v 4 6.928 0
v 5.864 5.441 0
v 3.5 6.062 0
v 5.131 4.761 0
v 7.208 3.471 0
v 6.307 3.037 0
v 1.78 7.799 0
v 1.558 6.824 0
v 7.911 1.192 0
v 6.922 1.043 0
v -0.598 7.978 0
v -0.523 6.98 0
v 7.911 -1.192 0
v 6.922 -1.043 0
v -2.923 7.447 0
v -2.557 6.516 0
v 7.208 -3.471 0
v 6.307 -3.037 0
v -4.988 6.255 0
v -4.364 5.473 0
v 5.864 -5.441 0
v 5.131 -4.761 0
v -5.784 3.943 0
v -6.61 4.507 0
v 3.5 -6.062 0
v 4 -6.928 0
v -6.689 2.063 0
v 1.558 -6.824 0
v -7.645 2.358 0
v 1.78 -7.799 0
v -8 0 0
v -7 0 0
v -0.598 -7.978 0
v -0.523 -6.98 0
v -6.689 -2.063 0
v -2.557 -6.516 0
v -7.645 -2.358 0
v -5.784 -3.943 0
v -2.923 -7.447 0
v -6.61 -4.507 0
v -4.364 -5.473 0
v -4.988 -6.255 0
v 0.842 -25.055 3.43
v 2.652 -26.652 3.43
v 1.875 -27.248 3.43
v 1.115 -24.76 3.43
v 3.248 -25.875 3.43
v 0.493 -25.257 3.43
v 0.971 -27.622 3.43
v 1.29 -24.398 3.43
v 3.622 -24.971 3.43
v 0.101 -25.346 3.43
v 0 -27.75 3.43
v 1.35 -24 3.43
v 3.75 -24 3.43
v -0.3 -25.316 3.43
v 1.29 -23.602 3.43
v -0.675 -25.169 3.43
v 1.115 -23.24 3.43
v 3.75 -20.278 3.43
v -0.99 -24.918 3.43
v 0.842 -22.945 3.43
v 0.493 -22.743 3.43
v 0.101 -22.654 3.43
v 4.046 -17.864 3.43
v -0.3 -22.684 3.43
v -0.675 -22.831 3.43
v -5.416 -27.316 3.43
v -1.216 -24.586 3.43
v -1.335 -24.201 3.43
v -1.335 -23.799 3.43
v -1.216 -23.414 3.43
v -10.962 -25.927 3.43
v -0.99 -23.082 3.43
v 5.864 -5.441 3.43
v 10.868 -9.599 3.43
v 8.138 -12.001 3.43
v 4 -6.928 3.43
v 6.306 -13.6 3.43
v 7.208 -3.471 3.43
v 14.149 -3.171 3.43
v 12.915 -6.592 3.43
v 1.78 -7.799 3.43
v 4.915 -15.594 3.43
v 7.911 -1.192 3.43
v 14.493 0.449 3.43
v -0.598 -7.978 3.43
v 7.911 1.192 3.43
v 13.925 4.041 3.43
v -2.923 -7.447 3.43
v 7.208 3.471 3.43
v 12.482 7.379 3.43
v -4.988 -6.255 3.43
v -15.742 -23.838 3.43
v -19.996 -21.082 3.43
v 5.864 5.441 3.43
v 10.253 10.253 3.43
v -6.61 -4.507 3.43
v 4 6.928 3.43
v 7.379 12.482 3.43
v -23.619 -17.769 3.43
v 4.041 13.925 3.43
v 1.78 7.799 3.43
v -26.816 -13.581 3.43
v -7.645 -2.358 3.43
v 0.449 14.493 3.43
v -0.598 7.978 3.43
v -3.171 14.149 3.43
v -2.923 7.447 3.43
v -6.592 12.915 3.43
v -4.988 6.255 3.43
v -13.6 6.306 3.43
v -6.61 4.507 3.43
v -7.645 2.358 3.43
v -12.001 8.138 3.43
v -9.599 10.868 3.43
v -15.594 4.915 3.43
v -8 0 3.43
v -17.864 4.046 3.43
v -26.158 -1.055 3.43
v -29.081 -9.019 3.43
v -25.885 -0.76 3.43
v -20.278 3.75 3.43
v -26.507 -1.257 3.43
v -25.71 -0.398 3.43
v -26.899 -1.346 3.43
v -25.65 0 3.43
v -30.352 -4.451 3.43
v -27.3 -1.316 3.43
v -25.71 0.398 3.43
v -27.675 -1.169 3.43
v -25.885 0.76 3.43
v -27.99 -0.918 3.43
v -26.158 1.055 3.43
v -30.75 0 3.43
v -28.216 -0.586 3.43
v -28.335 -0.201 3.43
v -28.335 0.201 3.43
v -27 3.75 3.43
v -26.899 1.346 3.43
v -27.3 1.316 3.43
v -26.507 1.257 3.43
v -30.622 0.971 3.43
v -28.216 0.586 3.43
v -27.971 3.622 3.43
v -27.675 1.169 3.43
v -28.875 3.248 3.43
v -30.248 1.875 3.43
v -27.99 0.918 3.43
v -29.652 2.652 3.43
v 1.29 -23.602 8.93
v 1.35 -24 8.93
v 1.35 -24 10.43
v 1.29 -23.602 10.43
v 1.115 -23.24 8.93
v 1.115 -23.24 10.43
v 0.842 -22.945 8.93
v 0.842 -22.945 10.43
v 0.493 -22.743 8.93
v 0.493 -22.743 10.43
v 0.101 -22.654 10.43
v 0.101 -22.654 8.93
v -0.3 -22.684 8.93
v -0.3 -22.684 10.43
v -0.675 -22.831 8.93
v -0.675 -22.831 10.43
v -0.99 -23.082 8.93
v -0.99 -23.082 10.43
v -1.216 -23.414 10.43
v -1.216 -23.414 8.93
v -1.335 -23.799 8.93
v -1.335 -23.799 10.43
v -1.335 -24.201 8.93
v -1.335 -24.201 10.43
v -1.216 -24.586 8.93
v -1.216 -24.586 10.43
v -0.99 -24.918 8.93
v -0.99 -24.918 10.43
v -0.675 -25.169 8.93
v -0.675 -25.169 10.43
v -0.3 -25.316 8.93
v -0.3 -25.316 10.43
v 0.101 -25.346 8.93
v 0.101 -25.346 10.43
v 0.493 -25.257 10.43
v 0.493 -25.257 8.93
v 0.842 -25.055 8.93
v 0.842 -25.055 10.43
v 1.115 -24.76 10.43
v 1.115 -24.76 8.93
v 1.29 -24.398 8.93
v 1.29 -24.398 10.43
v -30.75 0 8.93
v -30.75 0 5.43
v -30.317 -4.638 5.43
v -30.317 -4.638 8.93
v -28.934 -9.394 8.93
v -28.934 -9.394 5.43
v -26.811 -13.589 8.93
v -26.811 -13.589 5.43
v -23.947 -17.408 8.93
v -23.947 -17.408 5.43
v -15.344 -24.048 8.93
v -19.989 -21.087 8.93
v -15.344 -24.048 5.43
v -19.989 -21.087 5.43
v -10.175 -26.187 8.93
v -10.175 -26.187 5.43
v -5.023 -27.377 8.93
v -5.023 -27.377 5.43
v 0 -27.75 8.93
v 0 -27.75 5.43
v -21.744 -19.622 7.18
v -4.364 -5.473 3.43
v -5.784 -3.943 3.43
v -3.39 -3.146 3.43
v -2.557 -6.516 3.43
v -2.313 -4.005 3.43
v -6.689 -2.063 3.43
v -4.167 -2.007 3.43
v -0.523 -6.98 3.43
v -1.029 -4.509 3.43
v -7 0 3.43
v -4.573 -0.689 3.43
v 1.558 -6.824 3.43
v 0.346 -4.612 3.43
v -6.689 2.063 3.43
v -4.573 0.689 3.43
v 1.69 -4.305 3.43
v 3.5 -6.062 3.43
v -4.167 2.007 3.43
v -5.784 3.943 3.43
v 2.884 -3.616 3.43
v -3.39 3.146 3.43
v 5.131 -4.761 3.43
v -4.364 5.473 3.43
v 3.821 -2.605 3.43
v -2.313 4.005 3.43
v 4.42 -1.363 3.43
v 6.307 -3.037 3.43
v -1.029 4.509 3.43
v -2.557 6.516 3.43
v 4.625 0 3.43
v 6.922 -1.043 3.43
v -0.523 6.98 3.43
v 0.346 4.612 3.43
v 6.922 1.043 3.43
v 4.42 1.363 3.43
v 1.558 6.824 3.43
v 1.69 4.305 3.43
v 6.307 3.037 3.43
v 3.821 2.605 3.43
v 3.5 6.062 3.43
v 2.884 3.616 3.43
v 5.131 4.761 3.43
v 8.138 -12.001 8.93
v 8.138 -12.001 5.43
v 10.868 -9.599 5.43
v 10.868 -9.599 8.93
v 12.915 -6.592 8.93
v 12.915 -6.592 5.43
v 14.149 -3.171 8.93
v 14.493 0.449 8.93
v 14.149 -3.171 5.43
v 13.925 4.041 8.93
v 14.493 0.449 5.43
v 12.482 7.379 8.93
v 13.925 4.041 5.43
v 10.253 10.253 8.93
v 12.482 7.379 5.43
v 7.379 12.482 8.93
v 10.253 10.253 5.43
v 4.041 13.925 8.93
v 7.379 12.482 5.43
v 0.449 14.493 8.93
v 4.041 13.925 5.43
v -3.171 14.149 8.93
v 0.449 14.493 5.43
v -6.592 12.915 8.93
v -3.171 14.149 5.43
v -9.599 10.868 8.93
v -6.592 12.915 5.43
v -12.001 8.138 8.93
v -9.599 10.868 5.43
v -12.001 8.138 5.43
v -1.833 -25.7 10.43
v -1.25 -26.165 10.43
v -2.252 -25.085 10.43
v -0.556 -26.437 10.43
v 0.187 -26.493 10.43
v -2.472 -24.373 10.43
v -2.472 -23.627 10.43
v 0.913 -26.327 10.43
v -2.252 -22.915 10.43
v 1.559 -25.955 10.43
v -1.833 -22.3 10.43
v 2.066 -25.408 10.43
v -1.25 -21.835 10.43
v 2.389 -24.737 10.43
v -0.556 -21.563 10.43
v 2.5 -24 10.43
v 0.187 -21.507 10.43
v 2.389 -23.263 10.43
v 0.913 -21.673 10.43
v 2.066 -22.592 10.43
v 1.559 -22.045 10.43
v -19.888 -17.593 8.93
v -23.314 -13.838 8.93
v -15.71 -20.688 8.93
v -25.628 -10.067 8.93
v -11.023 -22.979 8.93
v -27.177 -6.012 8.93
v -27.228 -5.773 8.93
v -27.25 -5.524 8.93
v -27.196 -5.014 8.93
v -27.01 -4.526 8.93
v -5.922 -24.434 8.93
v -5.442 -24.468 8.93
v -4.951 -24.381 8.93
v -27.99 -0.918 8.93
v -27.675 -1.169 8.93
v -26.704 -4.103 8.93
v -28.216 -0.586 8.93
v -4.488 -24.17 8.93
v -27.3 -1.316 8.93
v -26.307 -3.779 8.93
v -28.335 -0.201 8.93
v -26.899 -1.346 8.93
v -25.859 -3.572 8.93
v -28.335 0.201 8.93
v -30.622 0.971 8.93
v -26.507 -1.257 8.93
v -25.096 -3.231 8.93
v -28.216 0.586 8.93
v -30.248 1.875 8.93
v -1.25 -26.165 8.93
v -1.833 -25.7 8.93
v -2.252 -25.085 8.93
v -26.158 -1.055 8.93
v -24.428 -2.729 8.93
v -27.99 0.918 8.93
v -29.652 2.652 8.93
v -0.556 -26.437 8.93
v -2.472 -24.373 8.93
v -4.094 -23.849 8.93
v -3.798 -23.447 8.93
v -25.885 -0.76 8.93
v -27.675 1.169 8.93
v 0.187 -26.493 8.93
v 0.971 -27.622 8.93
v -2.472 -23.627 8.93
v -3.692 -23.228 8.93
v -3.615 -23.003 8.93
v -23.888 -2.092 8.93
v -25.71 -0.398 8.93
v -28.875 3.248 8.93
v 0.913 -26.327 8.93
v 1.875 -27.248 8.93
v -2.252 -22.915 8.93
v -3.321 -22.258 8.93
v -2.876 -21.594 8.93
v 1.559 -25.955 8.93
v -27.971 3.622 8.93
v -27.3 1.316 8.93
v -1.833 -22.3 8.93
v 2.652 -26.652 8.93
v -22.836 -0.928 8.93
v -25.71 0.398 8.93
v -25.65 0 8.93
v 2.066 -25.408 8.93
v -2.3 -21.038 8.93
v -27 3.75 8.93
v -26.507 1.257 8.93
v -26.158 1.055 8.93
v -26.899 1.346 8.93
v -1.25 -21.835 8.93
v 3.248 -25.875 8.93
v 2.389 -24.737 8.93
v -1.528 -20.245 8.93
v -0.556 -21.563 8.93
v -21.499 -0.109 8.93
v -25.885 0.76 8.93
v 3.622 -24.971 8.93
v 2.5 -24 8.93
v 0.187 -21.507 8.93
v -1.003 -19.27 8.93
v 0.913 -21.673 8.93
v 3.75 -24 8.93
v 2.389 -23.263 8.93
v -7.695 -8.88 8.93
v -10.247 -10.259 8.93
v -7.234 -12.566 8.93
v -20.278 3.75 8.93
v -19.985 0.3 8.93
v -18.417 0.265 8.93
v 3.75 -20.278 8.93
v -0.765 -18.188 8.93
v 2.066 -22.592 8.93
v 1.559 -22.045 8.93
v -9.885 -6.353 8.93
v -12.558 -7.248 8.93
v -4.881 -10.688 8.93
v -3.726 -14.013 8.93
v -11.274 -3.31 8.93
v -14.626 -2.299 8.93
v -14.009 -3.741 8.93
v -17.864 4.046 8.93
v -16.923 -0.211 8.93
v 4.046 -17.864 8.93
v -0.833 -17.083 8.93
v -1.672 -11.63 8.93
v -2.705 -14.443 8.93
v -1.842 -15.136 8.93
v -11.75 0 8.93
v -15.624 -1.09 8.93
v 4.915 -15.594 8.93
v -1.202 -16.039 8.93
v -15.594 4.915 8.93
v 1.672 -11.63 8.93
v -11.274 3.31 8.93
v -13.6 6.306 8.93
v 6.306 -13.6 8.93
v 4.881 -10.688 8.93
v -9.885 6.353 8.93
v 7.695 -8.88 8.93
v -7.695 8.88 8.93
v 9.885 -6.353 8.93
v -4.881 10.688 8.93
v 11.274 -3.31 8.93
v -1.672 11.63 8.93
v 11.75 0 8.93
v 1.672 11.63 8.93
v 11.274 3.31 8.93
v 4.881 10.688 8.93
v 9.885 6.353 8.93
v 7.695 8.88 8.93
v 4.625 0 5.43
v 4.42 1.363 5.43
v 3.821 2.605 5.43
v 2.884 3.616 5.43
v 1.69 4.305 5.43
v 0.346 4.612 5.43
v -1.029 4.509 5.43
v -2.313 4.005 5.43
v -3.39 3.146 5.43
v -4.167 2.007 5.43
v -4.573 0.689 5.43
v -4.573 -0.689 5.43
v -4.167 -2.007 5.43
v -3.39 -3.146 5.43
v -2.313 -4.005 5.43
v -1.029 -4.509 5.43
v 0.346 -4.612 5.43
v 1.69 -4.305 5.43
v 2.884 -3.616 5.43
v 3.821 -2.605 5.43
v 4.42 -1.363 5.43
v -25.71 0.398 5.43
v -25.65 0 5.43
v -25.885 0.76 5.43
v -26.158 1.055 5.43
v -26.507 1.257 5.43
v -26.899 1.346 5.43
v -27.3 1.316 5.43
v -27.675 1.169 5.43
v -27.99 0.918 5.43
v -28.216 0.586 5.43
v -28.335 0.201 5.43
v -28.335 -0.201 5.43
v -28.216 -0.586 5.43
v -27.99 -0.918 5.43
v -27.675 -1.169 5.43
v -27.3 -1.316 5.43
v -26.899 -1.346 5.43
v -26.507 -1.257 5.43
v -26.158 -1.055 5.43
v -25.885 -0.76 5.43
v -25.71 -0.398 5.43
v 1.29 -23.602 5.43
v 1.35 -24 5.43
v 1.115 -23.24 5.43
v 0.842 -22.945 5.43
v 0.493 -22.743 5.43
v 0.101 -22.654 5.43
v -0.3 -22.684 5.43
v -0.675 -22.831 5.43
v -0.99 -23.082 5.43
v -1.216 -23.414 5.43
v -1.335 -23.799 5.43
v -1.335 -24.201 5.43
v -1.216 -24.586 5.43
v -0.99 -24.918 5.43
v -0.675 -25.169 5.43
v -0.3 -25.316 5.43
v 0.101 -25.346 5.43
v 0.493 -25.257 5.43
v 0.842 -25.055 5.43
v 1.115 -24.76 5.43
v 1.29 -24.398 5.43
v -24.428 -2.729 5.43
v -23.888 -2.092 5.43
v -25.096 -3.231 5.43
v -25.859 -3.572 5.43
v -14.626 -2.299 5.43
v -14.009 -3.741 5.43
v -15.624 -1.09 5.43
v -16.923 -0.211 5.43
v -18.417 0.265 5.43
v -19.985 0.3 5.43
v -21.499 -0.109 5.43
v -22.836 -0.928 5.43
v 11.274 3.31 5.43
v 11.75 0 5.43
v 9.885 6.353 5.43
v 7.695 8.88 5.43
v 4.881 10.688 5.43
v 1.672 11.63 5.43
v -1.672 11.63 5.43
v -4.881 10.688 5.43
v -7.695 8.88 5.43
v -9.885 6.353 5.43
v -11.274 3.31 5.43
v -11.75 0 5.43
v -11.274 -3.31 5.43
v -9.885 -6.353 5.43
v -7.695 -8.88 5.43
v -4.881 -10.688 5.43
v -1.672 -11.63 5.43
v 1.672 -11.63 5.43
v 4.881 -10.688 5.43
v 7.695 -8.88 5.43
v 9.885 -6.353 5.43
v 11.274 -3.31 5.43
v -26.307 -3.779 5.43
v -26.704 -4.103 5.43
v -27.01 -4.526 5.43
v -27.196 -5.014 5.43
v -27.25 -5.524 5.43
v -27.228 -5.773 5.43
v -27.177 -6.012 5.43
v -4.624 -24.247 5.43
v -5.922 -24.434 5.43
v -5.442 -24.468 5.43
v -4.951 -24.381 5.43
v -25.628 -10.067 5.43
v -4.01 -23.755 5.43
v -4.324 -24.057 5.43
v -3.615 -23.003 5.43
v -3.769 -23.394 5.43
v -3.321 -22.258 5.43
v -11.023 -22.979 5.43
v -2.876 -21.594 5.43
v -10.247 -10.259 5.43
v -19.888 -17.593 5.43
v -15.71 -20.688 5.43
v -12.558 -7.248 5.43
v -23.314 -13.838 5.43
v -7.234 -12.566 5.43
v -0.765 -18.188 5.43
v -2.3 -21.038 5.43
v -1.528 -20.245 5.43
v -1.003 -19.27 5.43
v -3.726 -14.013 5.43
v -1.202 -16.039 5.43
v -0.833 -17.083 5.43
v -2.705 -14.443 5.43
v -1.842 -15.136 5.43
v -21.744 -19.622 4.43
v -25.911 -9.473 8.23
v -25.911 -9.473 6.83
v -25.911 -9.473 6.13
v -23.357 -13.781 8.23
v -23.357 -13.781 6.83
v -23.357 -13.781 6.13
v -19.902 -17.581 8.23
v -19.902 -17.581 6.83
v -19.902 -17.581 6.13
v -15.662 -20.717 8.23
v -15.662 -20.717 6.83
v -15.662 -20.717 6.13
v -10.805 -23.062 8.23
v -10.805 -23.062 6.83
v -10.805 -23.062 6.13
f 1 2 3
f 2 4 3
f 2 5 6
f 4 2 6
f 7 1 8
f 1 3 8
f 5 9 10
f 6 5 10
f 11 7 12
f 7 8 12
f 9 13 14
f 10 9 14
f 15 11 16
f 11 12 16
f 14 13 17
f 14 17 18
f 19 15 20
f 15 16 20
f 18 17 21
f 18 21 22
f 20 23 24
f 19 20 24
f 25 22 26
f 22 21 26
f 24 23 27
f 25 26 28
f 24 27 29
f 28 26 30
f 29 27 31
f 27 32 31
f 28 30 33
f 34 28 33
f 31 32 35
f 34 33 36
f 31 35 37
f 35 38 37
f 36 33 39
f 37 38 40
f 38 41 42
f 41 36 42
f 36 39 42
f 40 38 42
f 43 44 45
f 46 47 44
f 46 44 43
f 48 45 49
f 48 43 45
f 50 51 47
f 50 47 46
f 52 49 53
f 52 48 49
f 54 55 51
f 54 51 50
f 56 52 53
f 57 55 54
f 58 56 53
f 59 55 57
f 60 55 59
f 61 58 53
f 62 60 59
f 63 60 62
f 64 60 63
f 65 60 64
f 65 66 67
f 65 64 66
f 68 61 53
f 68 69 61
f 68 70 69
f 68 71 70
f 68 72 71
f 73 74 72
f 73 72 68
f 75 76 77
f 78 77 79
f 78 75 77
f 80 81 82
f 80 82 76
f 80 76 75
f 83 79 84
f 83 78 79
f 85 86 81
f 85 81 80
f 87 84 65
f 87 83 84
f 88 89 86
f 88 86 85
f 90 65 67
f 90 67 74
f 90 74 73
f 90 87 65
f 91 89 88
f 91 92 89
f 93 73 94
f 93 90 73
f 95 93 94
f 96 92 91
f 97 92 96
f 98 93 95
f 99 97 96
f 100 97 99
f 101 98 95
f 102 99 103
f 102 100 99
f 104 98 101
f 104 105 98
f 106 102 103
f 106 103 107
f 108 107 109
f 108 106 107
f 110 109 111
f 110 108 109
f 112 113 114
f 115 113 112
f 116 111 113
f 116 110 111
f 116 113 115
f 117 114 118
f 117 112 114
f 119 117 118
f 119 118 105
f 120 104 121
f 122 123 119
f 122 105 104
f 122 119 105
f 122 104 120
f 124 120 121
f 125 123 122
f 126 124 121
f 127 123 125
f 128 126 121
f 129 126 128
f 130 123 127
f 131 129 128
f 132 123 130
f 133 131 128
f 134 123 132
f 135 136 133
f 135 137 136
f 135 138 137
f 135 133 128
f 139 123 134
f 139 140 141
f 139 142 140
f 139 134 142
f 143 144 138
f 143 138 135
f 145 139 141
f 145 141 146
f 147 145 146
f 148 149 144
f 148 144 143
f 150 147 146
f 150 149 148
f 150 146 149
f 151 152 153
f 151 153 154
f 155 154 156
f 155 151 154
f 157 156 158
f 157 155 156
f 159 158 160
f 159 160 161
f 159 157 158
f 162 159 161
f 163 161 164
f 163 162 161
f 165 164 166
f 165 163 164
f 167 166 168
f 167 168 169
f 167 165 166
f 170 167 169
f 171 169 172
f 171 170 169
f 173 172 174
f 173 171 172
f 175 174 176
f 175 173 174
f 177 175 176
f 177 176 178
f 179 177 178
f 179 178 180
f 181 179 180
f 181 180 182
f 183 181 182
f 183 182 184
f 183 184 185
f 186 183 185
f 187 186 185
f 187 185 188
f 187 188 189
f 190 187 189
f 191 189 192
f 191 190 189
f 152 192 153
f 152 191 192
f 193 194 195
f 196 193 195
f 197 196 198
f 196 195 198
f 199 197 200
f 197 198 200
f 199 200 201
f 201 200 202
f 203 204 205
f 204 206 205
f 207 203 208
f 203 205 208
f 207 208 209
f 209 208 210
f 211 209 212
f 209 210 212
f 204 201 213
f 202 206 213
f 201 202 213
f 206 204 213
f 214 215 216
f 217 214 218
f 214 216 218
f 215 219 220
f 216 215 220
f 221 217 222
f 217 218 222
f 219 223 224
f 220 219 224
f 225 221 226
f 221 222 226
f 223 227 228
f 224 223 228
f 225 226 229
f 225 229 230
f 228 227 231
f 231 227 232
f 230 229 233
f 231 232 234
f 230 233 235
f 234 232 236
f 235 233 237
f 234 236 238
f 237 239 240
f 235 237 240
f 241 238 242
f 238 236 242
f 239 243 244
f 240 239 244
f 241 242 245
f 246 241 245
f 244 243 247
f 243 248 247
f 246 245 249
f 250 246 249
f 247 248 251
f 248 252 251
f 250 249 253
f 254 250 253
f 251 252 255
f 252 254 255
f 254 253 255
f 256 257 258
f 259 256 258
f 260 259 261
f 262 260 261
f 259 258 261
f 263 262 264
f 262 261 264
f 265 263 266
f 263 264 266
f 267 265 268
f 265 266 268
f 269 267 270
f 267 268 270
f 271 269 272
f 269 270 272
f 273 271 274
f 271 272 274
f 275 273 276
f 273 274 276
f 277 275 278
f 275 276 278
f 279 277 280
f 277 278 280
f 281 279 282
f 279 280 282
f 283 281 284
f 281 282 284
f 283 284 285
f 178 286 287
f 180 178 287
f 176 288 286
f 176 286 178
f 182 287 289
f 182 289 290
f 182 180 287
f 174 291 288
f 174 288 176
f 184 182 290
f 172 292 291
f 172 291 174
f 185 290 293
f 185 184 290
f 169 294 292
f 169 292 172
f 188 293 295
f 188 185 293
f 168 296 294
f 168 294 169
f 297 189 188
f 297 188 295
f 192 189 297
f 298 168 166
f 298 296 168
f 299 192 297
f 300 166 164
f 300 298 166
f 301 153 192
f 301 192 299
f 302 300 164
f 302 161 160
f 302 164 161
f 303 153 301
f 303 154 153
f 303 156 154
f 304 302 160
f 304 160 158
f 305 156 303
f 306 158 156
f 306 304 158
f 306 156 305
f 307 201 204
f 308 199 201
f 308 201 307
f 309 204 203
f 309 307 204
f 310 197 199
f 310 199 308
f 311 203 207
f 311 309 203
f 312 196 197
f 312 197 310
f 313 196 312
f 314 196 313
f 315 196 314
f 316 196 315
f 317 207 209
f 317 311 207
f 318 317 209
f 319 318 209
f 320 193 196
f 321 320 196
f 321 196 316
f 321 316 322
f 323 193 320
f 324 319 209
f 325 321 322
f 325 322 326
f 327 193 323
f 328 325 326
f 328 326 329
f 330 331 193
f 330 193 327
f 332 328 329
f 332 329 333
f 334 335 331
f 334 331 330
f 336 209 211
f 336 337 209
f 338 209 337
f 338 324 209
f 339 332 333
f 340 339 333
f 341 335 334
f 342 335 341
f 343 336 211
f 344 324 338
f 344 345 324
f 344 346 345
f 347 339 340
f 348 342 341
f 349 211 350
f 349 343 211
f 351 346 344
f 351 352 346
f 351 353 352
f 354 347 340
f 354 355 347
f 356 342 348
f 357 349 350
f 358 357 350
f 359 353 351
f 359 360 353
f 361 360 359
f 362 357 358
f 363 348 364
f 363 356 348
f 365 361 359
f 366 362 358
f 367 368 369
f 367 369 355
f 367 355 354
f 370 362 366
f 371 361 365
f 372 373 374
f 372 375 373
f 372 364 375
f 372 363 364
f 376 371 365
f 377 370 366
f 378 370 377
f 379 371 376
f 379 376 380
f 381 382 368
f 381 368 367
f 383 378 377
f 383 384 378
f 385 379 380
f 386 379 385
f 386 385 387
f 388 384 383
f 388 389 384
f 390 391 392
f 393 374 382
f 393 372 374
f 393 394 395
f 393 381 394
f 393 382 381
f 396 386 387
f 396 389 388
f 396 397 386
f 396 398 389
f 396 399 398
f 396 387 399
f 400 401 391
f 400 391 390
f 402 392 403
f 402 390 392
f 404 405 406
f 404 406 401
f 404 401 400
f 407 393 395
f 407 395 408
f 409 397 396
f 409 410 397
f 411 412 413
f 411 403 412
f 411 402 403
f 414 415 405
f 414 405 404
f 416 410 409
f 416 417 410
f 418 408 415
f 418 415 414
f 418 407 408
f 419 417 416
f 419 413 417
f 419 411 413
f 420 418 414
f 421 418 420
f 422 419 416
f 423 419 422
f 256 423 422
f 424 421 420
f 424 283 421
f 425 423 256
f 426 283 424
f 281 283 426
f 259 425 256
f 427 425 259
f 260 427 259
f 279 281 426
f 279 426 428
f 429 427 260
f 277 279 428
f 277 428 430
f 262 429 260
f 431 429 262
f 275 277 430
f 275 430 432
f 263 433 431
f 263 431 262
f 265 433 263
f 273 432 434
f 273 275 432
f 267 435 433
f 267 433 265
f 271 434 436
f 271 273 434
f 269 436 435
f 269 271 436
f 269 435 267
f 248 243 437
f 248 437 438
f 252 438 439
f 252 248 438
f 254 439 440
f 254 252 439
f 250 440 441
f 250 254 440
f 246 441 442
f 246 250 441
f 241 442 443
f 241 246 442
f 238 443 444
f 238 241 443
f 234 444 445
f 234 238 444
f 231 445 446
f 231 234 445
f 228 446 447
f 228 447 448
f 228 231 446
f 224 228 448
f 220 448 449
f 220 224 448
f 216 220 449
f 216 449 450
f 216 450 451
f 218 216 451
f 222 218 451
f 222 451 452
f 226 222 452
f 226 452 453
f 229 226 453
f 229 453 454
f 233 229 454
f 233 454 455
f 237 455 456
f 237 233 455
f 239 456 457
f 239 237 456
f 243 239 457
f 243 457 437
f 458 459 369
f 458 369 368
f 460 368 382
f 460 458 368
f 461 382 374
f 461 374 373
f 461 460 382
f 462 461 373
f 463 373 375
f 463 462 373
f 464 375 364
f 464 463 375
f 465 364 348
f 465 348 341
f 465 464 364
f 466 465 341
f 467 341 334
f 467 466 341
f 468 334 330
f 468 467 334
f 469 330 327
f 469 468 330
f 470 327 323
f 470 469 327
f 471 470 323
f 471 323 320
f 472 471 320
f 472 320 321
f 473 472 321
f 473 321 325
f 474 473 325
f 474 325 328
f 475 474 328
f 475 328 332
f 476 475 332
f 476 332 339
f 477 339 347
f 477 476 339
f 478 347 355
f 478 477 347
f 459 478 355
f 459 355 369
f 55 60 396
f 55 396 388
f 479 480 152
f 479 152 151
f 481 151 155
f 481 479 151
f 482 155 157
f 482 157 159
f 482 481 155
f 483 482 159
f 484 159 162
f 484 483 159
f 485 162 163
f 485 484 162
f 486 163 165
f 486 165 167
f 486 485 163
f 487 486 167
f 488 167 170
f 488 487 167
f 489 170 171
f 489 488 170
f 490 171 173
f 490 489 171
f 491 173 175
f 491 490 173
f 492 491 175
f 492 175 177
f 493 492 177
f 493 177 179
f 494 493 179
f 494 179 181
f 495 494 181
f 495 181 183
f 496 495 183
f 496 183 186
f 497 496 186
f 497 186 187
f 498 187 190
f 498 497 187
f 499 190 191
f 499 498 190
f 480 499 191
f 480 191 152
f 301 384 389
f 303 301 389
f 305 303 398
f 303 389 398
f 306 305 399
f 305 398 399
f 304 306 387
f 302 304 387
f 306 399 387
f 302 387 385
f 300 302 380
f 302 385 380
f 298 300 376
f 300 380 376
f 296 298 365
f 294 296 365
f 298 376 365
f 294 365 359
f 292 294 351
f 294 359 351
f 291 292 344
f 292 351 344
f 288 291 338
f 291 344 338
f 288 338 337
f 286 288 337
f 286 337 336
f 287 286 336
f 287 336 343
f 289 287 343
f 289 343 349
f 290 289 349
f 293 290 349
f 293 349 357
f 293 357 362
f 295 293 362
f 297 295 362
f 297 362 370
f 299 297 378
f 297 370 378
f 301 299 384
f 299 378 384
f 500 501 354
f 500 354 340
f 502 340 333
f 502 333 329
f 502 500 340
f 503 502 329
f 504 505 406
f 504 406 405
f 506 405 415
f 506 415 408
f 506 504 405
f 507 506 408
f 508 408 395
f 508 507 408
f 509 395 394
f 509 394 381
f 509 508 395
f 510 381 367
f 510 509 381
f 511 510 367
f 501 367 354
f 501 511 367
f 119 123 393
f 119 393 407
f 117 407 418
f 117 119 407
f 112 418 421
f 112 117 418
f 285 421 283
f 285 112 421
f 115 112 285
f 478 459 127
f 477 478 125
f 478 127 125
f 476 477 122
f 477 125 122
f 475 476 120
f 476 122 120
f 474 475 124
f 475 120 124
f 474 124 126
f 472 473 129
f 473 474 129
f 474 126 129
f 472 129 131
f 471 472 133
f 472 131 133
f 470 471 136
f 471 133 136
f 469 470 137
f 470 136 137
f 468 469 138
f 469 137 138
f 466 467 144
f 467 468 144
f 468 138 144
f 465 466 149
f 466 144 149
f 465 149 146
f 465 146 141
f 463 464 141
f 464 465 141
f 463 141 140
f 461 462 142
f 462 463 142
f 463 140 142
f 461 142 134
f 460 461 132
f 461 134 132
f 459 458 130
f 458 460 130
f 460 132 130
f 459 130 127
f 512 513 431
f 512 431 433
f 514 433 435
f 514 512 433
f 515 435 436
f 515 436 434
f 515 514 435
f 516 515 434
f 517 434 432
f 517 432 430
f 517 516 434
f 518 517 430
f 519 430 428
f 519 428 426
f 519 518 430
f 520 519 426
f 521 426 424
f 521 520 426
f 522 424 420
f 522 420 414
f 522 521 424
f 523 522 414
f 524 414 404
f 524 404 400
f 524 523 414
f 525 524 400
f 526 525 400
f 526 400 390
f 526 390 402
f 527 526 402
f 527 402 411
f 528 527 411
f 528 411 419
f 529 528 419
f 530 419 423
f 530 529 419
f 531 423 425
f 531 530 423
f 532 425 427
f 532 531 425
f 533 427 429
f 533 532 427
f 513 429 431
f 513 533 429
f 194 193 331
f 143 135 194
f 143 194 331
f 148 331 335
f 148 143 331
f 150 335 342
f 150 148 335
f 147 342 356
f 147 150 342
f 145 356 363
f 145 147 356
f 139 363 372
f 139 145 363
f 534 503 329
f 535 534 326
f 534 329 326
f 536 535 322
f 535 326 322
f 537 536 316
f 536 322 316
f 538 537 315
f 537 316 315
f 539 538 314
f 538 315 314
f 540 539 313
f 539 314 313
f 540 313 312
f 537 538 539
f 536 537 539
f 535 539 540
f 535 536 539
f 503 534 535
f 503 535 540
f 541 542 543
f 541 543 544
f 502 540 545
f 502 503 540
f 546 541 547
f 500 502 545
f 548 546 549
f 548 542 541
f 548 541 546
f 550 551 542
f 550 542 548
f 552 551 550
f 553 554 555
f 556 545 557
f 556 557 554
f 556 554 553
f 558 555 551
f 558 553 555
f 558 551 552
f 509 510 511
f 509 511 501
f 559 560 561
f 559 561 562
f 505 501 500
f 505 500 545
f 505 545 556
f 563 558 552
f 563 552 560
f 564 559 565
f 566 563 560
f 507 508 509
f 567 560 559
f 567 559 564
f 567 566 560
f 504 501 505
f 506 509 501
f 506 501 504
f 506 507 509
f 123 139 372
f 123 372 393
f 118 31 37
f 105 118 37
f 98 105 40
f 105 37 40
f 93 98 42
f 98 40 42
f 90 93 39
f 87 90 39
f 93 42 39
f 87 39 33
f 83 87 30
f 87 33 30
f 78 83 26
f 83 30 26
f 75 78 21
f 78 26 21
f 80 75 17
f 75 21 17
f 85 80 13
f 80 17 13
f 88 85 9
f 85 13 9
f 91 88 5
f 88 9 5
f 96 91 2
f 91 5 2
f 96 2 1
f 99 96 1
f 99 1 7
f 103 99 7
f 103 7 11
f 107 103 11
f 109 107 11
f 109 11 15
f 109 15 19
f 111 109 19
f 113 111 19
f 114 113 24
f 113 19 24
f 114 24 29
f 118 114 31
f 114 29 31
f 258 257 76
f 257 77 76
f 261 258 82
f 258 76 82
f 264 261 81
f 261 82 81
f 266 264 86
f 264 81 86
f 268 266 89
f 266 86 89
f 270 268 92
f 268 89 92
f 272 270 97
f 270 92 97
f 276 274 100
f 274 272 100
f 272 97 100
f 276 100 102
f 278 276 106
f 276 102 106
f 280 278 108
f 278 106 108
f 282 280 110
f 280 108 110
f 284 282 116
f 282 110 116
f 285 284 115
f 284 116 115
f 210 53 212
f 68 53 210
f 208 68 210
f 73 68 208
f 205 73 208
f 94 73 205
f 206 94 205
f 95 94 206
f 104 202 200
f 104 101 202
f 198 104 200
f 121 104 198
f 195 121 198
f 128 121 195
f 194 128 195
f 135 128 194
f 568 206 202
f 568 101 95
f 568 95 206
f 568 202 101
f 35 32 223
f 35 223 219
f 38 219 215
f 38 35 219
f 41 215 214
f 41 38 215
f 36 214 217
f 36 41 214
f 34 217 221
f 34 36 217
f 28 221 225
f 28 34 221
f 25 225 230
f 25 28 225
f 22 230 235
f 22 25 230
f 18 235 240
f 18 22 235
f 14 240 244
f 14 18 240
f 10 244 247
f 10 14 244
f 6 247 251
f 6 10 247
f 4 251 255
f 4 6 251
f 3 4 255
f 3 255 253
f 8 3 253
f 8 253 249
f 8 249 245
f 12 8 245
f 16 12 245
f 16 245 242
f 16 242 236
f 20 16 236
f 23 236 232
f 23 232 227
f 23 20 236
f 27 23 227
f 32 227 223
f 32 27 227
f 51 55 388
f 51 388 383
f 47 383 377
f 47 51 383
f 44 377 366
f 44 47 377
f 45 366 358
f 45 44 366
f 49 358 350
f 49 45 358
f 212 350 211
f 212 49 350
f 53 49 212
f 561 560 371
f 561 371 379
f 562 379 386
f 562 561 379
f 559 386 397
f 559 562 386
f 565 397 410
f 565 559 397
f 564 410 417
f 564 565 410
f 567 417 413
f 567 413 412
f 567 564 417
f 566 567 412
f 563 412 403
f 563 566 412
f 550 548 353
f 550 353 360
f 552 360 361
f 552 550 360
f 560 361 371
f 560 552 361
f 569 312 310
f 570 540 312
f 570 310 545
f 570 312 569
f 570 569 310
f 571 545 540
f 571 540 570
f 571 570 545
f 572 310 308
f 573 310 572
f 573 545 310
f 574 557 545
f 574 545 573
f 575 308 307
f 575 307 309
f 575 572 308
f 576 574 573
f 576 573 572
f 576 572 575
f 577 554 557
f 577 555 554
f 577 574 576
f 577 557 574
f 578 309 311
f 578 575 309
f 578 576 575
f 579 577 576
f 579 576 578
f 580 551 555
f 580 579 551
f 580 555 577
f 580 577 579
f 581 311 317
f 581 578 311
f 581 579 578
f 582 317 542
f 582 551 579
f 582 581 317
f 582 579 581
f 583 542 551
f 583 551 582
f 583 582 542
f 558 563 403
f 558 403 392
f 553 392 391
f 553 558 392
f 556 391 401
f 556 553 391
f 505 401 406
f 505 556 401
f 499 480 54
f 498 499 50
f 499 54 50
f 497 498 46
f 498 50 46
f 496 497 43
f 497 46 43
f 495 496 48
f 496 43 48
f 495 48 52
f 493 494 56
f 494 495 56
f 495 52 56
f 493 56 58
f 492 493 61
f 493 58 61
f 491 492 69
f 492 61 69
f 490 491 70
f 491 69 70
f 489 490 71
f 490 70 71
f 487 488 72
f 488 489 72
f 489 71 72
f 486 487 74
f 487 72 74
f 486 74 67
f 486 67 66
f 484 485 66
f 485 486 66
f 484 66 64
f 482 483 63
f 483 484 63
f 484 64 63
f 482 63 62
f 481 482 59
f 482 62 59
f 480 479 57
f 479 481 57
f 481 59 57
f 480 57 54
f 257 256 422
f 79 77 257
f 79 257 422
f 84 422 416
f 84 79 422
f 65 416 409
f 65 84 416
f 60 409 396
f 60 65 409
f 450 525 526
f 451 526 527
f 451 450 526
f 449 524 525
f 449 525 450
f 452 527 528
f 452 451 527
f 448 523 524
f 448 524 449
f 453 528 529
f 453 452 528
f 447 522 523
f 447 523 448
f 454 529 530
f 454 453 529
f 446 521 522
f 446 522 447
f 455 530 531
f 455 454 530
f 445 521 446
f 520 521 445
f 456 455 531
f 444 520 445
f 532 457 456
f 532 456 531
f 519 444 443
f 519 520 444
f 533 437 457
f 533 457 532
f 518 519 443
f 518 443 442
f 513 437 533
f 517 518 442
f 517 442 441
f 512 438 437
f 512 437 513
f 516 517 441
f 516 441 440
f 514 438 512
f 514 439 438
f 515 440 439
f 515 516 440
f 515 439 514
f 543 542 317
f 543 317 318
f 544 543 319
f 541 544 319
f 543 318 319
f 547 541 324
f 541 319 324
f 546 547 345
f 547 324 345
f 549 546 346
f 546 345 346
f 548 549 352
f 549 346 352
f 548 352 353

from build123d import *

# Parameters (mm, degrees)
SKETCH1_R           = 8
SKETCH1_R_2         = 7
BOSS_EXTRUDE1_DEPTH = 3.43
SKETCH2_R           = 14.5
SKETCH2_R_2         = 4.625
BOSS_EXTRUDE2_DEPTH = 2
SKETCH3_R           = 11.75
SKETCH3_R_2         = 1.35
BOSS_EXTRUDE3_DEPTH = 3.5
BOSS_EXTRUDE4_START = 2
SKETCH4_R           = 1.35
BOSS_EXTRUDE4_DEPTH = 2
CUT_EXTRUDE1_START  = -3.5
CUT_EXTRUDE1_DEPTH  = 3.5
FILLET1_R           = 2
SKETCH8_R           = 2.5
SKETCH8_R_2         = 1.35
BOSS_EXTRUDE6_DEPTH = 1.5


# Read off the part's stored shape, not the designer's step: Cut-Extrude1
with BuildPart() as part:
    # Sketch1 → Boss-Extrude1 (new body)
    with BuildSketch(Plane.XY):
        with Locations(Location((0, 0, 0), (0, 0, 180))):
            Circle(SKETCH1_R)
        with Locations(Location((0, 0, 0), (0, 0, 180))):
            Circle(SKETCH1_R_2, mode=Mode.SUBTRACT)
    extrude(amount=BOSS_EXTRUDE1_DEPTH)

    # Sketch2 → Boss-Extrude2 (add)
    with BuildSketch(Plane.XY.offset(3.43)):
        Circle(SKETCH2_R)
        Circle(SKETCH2_R_2, mode=Mode.SUBTRACT)
    extrude(amount=BOSS_EXTRUDE2_DEPTH)

    # Sketch3 → Boss-Extrude3 (add)
    with BuildSketch(Plane.XY.offset(5.43)):
        with BuildLine():
            Line((3.75, -24), (3.75, -20.277758752))
            ThreePointArc((3.75, -20.277758752), (4.914773659, -15.593874092), (8.137755102, -12.001122527))
            ThreePointArc((8.137755102, -12.001122527), (10.253048327, 10.253048327), (-12.001122527, 8.137755102))
            ThreePointArc((-12.001122527, 8.137755102), (-15.593874092, 4.914773659), (-20.277758752, 3.75))
            Line((-20.277758752, 3.75), (-27, 3.75))
            ThreePointArc((-27, 3.75), (-29.651650429, 2.651650429), (-30.75, 0))
            add(Edge.make_bspline(
                [(-30.75, 0), (-30.75, -27.75), (0, -27.75)],
                knots=[0, 0, 0, 1.570796327, 1.570796327, 1.570796327], degree=2, weights=[1, 0.707106781, 1]))
            ThreePointArc((0, -27.75), (2.651650429, -26.651650429), (3.75, -24))
        make_face()
        Circle(SKETCH3_R, mode=Mode.SUBTRACT)
        with Locations((0, -24)):
            Circle(SKETCH3_R_2, mode=Mode.SUBTRACT)
        with Locations((-27, 0)):
            Circle(SKETCH3_R_2, mode=Mode.SUBTRACT)
    extrude(amount=BOSS_EXTRUDE3_DEPTH)

    # Sketch4 → Boss-Extrude4 (add)
    with BuildSketch(Plane(origin=(0, 0, 5.43), x_dir=(-1, 0, 0), z_dir=(0, 0, -1)).offset(BOSS_EXTRUDE4_START)):
        with BuildLine():
            Line((-3.75, -20.277758752), (-3.75, -24))
            ThreePointArc((-3.75, -24), (-2.651650429, -26.651650429), (0, -27.75))
            add(Edge.make_bspline(
                [(0, -27.75), (30.75, -27.75), (30.75, 0)],
                knots=[4.71238898, 4.71238898, 4.71238898, 6.283185307, 6.283185307, 6.283185307], degree=2, weights=[1, 0.707106781, 1]))
            ThreePointArc((30.75, 0), (29.651650429, 2.651650429), (27, 3.75))
            Line((27, 3.75), (20.277758752, 3.75))
            ThreePointArc((20.277758752, 3.75), (15.593874092, 4.914773659), (12.001122527, 8.137755102))
            ThreePointArc((12.001122527, 8.137755102), (10.253048327, -10.253048327), (-8.137755102, -12.001122527))
            ThreePointArc((-8.137755102, -12.001122527), (-4.914773659, -15.593874092), (-3.75, -20.277758752))
        make_face()
        with Locations(Location((27, 0, 0), (0, 0, 180))):
            Circle(SKETCH4_R, mode=Mode.SUBTRACT)
        with Locations(Location((0, -24, 0), (0, 0, 180))):
            Circle(SKETCH4_R, mode=Mode.SUBTRACT)
    extrude(amount=-BOSS_EXTRUDE4_DEPTH)

    # Cut-Extrude1 outline → Cut-Extrude1 (cut)
    with BuildSketch(Plane.XY.offset(8.93).offset(CUT_EXTRUDE1_START)):
        with BuildLine():
            ThreePointArc((-23.887668919, -2.091864059), (-25.551843779, -3.459095772), (-27.693722308, -3.685274665))
            add(Edge.make_bspline(
                [(-27.693722308, -3.685274665), (-27.362240175, -5.665830378), (-25.799154504, -10.759842679), (-20.433371513, -18.029392928), (-12.653019422, -22.727558912), (-6.72944223, -24.348951045), (-4.285685075, -24.711452028), (-3.667038232, -24.784430116)],
                knots=[0.149690792, 0.149690792, 0.149690792, 0.149690792, 0.392699082, 0.785398163, 1.178097245, 1.374446786, 1.440624357, 1.440624357, 1.440624357, 1.440624357], degree=3))
            ThreePointArc((-3.667038232, -24.784430116), (-3.522792072, -22.714528875), (-2.300027155, -21.038180444))
            ThreePointArc((-2.300027155, -21.038180444), (-0.83329357, -17.083388646), (-3.725629572, -14.013196791))
            ThreePointArc((-3.725629572, -14.013196791), (-10.247441141, -10.258652449), (-14.009114583, -3.740950226))
            ThreePointArc((-14.009114583, -3.740950226), (-18.417300739, 0.264998128), (-23.887668919, -2.091864059))
        make_face()
    extrude(amount=CUT_EXTRUDE1_DEPTH, mode=Mode.SUBTRACT)

    # Fillet1
    fillet1_edges = [part.edges().sort_by_distance(p)[0] for p in [
        (-3.667038232, -24.784430116, 7.18),
        (-27.693722308, -3.685274665, 7.18),
    ]]
    fillet(fillet1_edges, radius=FILLET1_R)

    # Sketch8 → Boss-Extrude6 (add)
    with BuildSketch(Plane.XY.offset(8.93)):
        with Locations((0, -24)):
            Circle(SKETCH8_R)
        with Locations((0, -24)):
            Circle(SKETCH8_R_2, mode=Mode.SUBTRACT)
    extrude(amount=BOSS_EXTRUDE6_DEPTH)


solid = part.part
